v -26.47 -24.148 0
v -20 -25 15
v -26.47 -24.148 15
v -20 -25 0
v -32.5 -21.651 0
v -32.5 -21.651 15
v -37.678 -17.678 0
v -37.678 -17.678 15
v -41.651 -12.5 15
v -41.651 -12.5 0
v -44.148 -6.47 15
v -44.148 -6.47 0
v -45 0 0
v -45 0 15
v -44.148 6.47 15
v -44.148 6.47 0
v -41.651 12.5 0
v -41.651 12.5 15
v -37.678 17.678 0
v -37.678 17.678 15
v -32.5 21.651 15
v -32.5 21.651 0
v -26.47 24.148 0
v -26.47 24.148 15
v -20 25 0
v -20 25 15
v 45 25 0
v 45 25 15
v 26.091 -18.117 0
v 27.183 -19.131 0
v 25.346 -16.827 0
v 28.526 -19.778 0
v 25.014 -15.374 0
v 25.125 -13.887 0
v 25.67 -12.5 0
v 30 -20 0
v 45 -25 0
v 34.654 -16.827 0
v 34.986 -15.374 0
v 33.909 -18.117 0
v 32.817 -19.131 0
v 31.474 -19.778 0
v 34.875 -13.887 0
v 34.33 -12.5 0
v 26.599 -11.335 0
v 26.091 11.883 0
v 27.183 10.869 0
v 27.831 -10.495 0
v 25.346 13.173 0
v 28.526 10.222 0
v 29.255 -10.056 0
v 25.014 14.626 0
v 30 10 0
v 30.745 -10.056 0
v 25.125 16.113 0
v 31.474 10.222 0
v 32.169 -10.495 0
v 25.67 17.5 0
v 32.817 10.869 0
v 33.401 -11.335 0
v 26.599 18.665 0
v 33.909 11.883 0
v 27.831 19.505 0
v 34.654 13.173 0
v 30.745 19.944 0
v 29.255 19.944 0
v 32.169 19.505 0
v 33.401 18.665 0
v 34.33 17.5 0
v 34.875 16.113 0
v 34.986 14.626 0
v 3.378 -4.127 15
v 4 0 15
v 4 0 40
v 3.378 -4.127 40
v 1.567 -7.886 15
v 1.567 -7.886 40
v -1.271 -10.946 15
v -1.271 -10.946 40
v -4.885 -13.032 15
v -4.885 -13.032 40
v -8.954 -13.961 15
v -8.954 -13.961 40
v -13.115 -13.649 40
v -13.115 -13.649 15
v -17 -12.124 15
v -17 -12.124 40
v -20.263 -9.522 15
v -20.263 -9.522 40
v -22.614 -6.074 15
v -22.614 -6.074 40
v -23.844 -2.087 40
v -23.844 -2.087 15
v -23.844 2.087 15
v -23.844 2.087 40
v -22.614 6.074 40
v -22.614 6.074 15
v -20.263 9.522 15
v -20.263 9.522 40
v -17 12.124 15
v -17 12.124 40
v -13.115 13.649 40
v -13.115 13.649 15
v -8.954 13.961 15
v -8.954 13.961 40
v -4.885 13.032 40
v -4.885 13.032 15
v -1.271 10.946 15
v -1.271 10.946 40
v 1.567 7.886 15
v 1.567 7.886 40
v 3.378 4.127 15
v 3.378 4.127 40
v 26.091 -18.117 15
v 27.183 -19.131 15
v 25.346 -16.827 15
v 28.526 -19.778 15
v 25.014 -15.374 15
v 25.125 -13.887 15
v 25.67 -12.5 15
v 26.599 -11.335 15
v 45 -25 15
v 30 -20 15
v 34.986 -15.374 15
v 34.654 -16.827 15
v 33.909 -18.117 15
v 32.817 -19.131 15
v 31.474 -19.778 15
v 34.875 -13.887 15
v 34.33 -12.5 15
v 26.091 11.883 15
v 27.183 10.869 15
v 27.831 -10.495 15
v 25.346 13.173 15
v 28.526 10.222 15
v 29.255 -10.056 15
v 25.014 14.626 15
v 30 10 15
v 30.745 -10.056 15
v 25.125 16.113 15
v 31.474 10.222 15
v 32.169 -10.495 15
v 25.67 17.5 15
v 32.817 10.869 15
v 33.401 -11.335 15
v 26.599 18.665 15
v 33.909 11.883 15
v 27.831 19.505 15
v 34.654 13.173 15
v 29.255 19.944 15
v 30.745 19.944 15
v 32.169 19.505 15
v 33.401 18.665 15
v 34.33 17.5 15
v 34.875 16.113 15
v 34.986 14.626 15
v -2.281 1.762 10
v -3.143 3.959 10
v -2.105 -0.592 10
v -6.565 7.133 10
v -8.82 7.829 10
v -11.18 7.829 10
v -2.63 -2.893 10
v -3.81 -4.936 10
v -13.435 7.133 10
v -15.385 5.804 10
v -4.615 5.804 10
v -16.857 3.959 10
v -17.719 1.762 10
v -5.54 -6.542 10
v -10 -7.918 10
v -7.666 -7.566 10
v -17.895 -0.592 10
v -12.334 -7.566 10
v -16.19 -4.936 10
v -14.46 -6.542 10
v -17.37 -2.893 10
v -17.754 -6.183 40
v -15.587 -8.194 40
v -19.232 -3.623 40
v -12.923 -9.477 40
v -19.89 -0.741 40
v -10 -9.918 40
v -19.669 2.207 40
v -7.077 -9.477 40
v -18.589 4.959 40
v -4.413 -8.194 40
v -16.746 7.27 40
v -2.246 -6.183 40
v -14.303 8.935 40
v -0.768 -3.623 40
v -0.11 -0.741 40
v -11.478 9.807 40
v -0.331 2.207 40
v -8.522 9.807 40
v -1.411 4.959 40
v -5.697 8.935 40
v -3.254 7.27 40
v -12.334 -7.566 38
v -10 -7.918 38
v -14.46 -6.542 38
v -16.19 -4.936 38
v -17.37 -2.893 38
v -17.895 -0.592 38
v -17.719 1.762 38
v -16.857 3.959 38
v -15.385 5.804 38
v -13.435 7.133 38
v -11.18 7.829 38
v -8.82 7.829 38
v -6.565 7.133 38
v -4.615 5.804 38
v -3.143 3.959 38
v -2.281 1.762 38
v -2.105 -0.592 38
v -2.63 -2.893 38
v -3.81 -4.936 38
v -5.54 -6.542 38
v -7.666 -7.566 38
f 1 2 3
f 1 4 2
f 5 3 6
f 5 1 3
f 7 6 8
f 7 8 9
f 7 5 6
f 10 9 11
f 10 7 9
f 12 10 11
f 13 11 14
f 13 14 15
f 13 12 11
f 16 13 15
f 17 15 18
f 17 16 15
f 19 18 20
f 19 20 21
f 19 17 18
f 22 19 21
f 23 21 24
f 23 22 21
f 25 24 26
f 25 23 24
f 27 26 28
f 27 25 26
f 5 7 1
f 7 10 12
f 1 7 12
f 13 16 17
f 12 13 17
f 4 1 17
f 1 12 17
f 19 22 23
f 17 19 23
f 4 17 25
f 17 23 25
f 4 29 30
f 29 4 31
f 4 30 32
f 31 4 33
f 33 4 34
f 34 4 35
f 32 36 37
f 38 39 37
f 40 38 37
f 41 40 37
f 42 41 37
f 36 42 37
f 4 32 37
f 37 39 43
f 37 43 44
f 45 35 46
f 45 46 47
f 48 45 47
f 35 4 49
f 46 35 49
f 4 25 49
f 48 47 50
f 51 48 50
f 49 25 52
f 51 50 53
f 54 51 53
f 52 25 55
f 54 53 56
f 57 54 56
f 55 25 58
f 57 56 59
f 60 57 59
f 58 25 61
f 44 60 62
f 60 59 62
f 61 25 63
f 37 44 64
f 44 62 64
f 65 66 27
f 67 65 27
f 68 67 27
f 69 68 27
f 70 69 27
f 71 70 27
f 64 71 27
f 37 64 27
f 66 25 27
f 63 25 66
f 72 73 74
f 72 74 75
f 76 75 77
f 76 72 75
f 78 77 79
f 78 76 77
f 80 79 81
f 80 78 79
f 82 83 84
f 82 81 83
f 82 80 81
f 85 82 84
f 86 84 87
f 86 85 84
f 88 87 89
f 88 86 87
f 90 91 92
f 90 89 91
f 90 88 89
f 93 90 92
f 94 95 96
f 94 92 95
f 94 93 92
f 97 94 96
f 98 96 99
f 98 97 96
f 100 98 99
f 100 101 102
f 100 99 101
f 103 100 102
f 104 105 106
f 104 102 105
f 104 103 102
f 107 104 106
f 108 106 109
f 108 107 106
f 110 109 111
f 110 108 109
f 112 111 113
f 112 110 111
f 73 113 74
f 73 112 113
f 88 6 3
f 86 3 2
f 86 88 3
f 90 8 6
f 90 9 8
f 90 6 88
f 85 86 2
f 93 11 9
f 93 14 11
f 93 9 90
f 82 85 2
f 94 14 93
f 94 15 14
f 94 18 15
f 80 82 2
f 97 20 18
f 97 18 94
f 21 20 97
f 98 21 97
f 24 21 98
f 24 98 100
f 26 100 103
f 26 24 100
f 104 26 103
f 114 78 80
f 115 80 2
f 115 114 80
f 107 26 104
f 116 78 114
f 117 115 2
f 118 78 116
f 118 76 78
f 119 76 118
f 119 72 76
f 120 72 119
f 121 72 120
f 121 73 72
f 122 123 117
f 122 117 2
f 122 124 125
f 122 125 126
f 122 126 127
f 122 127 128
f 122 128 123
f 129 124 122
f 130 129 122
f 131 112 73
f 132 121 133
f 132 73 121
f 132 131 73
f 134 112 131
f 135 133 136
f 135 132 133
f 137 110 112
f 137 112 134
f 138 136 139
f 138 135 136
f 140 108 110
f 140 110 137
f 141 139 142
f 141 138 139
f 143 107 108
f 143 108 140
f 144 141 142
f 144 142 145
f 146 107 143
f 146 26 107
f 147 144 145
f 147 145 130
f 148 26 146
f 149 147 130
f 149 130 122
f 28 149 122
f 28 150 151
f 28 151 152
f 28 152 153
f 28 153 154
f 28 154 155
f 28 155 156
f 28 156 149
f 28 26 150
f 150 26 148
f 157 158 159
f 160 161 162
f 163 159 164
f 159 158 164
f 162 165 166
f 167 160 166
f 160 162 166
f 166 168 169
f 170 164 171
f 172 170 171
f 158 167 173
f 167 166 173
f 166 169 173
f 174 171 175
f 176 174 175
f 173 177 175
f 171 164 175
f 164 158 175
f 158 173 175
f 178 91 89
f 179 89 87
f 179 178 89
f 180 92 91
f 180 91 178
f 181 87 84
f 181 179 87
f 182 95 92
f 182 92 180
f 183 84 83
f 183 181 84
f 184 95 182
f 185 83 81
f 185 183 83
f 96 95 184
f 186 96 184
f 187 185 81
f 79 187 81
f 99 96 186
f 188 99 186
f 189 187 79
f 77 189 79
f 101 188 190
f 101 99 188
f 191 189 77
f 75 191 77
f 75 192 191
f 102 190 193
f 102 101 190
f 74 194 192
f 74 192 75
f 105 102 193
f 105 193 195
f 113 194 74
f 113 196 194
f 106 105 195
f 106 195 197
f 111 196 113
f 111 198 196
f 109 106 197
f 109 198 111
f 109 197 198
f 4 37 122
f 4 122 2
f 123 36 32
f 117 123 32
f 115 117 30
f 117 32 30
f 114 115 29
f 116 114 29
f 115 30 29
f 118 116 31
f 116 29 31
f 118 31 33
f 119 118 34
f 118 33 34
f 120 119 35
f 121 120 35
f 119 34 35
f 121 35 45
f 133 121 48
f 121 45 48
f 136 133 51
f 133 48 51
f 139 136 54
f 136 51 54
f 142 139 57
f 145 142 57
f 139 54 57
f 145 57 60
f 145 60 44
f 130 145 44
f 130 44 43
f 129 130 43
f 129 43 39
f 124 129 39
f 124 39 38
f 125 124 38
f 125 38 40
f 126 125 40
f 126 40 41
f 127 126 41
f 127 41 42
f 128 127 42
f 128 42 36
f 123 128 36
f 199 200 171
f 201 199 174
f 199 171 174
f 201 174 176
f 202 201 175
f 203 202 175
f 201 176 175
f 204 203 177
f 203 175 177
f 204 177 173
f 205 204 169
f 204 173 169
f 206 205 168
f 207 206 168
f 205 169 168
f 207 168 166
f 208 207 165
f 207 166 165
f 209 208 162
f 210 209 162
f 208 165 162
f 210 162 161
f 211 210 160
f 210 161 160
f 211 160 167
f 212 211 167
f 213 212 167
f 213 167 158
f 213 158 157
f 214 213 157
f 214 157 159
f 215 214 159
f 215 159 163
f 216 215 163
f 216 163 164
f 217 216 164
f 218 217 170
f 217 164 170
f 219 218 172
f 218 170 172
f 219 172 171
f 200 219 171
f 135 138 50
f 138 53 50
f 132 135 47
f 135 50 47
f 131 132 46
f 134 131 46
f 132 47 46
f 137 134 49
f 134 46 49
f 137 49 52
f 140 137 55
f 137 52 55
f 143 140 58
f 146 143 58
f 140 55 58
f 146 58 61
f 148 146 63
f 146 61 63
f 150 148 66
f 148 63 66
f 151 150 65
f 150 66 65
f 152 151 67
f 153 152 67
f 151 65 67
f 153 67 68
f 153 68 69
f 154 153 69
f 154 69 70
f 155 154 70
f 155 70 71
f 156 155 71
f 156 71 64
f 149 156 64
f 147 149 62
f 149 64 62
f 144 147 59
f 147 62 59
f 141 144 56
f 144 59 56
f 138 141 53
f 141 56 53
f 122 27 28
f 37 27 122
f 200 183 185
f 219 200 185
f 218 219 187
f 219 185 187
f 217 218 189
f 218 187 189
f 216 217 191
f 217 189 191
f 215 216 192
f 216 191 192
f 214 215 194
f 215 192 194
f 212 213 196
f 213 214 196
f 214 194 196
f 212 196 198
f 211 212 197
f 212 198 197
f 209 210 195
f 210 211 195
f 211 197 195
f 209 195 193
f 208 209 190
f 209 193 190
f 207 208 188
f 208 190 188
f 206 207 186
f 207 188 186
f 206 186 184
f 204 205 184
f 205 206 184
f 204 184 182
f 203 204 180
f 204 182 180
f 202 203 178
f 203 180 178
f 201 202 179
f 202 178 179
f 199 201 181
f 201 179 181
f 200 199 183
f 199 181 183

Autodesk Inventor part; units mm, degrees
ref_plane "YZ Plane" through (0, 0, 0) normal (1, 0, 0) x (0, 1, 0)
ref_plane "XZ Plane" through (0, 0, 0) normal (0, 1, 0) x (-1, 0, 0)
ref_plane "XY Plane" through (0, 0, 0) normal (0, 0, 1) x (1, 0, 0)
sketch "Эскиз1" plane through (0, 0, 0) normal (0, 0, 1) x (1, 0, 0)
  line L0 (-69.2132, 0) -> (64.0355, 0) projected
  line L1 (0, -42.2487) -> (0, 42.2487) projected
  line L2 (-20, 25) -> (45, 25)
  line L3 (45, 25) -> (45, -25)
  line L4 (45, -25) -> (-20, -25)
  line L5 (-45, 0) -> (-45, 0)
  arc A0 (-20, 25) -> (-45, 0) centre (-20, 0) ccw
  arc A1 (-45, 0) -> (-20, -25) centre (-20, 0) ccw
  point P0 (0, 0)
  point P1 (-45, 25)
  dimension "d0" = 50
  dimension "d1" = 90
  dimension "d2" = 25
extrude "Выдавливание1" add sketch "Эскиз1" along normal blind 15
sketch "Эскиз2" plane through (0, 0, 15) normal (0, 0, 1) x (1, 0, 0)
  line L0 (45, -25) -> (45, 25) projected
  circle A0 centre (-10, 0) radius 14
  point P0 (0, 0)
  point P1 (30, 14.0013)
  point P2 (31.2898, -16.1928)
  dimension "d6" = 15
  dimension "d7" = 40
  dimension "d8" = 28
extrude "Выдавливание2" add sketch "Эскиз2" along normal blind 25
sketch "Эскиз3" plane through (-10, 0, 40) normal (0, 0, 1) x (1, 0, 0)
  point P0 (10, 0)
sketch "Эскиз4" plane through (-10, 0, 40) normal (0, 0, 1) x (1, 0, 0)
  point P0 (10, 0)
  point P1 (0, 0)
hole "Отверстие1" at (-10, 0, 40) direction (0, 0, -1) diameter 15.835 depth 30 thread size "M18x2" class "6H" standard "ISO Metric profile"
chamfer "Фаска1" distance 2 angle 45 1 edges at (-10, 7.9175, 40)
sketch "Эскиз5" plane through (0, 0, 15) normal (0, 0, 1) x (1, 0, 0)
  line L0 (45, -25) -> (45, 25) projected
  circle A0 centre (-10, 0) radius 7.9175 projected
  line L1 (-63, 0) -> (63, 0) projected
  line L2 (0, -35) -> (0, 35) projected
  point P0 (0, 0)
  point P1 (30, 15)
  point P2 (30, -15)
  dimension "d21" = 15
  dimension "d22" = 40
  dimension "d23" = 30
hole "Отверстие2" at (30, 15, 15) at (30, -15, 15) direction (0, 0, -1) diameter 10 end through all
properties part number "Основание дз курганова"
